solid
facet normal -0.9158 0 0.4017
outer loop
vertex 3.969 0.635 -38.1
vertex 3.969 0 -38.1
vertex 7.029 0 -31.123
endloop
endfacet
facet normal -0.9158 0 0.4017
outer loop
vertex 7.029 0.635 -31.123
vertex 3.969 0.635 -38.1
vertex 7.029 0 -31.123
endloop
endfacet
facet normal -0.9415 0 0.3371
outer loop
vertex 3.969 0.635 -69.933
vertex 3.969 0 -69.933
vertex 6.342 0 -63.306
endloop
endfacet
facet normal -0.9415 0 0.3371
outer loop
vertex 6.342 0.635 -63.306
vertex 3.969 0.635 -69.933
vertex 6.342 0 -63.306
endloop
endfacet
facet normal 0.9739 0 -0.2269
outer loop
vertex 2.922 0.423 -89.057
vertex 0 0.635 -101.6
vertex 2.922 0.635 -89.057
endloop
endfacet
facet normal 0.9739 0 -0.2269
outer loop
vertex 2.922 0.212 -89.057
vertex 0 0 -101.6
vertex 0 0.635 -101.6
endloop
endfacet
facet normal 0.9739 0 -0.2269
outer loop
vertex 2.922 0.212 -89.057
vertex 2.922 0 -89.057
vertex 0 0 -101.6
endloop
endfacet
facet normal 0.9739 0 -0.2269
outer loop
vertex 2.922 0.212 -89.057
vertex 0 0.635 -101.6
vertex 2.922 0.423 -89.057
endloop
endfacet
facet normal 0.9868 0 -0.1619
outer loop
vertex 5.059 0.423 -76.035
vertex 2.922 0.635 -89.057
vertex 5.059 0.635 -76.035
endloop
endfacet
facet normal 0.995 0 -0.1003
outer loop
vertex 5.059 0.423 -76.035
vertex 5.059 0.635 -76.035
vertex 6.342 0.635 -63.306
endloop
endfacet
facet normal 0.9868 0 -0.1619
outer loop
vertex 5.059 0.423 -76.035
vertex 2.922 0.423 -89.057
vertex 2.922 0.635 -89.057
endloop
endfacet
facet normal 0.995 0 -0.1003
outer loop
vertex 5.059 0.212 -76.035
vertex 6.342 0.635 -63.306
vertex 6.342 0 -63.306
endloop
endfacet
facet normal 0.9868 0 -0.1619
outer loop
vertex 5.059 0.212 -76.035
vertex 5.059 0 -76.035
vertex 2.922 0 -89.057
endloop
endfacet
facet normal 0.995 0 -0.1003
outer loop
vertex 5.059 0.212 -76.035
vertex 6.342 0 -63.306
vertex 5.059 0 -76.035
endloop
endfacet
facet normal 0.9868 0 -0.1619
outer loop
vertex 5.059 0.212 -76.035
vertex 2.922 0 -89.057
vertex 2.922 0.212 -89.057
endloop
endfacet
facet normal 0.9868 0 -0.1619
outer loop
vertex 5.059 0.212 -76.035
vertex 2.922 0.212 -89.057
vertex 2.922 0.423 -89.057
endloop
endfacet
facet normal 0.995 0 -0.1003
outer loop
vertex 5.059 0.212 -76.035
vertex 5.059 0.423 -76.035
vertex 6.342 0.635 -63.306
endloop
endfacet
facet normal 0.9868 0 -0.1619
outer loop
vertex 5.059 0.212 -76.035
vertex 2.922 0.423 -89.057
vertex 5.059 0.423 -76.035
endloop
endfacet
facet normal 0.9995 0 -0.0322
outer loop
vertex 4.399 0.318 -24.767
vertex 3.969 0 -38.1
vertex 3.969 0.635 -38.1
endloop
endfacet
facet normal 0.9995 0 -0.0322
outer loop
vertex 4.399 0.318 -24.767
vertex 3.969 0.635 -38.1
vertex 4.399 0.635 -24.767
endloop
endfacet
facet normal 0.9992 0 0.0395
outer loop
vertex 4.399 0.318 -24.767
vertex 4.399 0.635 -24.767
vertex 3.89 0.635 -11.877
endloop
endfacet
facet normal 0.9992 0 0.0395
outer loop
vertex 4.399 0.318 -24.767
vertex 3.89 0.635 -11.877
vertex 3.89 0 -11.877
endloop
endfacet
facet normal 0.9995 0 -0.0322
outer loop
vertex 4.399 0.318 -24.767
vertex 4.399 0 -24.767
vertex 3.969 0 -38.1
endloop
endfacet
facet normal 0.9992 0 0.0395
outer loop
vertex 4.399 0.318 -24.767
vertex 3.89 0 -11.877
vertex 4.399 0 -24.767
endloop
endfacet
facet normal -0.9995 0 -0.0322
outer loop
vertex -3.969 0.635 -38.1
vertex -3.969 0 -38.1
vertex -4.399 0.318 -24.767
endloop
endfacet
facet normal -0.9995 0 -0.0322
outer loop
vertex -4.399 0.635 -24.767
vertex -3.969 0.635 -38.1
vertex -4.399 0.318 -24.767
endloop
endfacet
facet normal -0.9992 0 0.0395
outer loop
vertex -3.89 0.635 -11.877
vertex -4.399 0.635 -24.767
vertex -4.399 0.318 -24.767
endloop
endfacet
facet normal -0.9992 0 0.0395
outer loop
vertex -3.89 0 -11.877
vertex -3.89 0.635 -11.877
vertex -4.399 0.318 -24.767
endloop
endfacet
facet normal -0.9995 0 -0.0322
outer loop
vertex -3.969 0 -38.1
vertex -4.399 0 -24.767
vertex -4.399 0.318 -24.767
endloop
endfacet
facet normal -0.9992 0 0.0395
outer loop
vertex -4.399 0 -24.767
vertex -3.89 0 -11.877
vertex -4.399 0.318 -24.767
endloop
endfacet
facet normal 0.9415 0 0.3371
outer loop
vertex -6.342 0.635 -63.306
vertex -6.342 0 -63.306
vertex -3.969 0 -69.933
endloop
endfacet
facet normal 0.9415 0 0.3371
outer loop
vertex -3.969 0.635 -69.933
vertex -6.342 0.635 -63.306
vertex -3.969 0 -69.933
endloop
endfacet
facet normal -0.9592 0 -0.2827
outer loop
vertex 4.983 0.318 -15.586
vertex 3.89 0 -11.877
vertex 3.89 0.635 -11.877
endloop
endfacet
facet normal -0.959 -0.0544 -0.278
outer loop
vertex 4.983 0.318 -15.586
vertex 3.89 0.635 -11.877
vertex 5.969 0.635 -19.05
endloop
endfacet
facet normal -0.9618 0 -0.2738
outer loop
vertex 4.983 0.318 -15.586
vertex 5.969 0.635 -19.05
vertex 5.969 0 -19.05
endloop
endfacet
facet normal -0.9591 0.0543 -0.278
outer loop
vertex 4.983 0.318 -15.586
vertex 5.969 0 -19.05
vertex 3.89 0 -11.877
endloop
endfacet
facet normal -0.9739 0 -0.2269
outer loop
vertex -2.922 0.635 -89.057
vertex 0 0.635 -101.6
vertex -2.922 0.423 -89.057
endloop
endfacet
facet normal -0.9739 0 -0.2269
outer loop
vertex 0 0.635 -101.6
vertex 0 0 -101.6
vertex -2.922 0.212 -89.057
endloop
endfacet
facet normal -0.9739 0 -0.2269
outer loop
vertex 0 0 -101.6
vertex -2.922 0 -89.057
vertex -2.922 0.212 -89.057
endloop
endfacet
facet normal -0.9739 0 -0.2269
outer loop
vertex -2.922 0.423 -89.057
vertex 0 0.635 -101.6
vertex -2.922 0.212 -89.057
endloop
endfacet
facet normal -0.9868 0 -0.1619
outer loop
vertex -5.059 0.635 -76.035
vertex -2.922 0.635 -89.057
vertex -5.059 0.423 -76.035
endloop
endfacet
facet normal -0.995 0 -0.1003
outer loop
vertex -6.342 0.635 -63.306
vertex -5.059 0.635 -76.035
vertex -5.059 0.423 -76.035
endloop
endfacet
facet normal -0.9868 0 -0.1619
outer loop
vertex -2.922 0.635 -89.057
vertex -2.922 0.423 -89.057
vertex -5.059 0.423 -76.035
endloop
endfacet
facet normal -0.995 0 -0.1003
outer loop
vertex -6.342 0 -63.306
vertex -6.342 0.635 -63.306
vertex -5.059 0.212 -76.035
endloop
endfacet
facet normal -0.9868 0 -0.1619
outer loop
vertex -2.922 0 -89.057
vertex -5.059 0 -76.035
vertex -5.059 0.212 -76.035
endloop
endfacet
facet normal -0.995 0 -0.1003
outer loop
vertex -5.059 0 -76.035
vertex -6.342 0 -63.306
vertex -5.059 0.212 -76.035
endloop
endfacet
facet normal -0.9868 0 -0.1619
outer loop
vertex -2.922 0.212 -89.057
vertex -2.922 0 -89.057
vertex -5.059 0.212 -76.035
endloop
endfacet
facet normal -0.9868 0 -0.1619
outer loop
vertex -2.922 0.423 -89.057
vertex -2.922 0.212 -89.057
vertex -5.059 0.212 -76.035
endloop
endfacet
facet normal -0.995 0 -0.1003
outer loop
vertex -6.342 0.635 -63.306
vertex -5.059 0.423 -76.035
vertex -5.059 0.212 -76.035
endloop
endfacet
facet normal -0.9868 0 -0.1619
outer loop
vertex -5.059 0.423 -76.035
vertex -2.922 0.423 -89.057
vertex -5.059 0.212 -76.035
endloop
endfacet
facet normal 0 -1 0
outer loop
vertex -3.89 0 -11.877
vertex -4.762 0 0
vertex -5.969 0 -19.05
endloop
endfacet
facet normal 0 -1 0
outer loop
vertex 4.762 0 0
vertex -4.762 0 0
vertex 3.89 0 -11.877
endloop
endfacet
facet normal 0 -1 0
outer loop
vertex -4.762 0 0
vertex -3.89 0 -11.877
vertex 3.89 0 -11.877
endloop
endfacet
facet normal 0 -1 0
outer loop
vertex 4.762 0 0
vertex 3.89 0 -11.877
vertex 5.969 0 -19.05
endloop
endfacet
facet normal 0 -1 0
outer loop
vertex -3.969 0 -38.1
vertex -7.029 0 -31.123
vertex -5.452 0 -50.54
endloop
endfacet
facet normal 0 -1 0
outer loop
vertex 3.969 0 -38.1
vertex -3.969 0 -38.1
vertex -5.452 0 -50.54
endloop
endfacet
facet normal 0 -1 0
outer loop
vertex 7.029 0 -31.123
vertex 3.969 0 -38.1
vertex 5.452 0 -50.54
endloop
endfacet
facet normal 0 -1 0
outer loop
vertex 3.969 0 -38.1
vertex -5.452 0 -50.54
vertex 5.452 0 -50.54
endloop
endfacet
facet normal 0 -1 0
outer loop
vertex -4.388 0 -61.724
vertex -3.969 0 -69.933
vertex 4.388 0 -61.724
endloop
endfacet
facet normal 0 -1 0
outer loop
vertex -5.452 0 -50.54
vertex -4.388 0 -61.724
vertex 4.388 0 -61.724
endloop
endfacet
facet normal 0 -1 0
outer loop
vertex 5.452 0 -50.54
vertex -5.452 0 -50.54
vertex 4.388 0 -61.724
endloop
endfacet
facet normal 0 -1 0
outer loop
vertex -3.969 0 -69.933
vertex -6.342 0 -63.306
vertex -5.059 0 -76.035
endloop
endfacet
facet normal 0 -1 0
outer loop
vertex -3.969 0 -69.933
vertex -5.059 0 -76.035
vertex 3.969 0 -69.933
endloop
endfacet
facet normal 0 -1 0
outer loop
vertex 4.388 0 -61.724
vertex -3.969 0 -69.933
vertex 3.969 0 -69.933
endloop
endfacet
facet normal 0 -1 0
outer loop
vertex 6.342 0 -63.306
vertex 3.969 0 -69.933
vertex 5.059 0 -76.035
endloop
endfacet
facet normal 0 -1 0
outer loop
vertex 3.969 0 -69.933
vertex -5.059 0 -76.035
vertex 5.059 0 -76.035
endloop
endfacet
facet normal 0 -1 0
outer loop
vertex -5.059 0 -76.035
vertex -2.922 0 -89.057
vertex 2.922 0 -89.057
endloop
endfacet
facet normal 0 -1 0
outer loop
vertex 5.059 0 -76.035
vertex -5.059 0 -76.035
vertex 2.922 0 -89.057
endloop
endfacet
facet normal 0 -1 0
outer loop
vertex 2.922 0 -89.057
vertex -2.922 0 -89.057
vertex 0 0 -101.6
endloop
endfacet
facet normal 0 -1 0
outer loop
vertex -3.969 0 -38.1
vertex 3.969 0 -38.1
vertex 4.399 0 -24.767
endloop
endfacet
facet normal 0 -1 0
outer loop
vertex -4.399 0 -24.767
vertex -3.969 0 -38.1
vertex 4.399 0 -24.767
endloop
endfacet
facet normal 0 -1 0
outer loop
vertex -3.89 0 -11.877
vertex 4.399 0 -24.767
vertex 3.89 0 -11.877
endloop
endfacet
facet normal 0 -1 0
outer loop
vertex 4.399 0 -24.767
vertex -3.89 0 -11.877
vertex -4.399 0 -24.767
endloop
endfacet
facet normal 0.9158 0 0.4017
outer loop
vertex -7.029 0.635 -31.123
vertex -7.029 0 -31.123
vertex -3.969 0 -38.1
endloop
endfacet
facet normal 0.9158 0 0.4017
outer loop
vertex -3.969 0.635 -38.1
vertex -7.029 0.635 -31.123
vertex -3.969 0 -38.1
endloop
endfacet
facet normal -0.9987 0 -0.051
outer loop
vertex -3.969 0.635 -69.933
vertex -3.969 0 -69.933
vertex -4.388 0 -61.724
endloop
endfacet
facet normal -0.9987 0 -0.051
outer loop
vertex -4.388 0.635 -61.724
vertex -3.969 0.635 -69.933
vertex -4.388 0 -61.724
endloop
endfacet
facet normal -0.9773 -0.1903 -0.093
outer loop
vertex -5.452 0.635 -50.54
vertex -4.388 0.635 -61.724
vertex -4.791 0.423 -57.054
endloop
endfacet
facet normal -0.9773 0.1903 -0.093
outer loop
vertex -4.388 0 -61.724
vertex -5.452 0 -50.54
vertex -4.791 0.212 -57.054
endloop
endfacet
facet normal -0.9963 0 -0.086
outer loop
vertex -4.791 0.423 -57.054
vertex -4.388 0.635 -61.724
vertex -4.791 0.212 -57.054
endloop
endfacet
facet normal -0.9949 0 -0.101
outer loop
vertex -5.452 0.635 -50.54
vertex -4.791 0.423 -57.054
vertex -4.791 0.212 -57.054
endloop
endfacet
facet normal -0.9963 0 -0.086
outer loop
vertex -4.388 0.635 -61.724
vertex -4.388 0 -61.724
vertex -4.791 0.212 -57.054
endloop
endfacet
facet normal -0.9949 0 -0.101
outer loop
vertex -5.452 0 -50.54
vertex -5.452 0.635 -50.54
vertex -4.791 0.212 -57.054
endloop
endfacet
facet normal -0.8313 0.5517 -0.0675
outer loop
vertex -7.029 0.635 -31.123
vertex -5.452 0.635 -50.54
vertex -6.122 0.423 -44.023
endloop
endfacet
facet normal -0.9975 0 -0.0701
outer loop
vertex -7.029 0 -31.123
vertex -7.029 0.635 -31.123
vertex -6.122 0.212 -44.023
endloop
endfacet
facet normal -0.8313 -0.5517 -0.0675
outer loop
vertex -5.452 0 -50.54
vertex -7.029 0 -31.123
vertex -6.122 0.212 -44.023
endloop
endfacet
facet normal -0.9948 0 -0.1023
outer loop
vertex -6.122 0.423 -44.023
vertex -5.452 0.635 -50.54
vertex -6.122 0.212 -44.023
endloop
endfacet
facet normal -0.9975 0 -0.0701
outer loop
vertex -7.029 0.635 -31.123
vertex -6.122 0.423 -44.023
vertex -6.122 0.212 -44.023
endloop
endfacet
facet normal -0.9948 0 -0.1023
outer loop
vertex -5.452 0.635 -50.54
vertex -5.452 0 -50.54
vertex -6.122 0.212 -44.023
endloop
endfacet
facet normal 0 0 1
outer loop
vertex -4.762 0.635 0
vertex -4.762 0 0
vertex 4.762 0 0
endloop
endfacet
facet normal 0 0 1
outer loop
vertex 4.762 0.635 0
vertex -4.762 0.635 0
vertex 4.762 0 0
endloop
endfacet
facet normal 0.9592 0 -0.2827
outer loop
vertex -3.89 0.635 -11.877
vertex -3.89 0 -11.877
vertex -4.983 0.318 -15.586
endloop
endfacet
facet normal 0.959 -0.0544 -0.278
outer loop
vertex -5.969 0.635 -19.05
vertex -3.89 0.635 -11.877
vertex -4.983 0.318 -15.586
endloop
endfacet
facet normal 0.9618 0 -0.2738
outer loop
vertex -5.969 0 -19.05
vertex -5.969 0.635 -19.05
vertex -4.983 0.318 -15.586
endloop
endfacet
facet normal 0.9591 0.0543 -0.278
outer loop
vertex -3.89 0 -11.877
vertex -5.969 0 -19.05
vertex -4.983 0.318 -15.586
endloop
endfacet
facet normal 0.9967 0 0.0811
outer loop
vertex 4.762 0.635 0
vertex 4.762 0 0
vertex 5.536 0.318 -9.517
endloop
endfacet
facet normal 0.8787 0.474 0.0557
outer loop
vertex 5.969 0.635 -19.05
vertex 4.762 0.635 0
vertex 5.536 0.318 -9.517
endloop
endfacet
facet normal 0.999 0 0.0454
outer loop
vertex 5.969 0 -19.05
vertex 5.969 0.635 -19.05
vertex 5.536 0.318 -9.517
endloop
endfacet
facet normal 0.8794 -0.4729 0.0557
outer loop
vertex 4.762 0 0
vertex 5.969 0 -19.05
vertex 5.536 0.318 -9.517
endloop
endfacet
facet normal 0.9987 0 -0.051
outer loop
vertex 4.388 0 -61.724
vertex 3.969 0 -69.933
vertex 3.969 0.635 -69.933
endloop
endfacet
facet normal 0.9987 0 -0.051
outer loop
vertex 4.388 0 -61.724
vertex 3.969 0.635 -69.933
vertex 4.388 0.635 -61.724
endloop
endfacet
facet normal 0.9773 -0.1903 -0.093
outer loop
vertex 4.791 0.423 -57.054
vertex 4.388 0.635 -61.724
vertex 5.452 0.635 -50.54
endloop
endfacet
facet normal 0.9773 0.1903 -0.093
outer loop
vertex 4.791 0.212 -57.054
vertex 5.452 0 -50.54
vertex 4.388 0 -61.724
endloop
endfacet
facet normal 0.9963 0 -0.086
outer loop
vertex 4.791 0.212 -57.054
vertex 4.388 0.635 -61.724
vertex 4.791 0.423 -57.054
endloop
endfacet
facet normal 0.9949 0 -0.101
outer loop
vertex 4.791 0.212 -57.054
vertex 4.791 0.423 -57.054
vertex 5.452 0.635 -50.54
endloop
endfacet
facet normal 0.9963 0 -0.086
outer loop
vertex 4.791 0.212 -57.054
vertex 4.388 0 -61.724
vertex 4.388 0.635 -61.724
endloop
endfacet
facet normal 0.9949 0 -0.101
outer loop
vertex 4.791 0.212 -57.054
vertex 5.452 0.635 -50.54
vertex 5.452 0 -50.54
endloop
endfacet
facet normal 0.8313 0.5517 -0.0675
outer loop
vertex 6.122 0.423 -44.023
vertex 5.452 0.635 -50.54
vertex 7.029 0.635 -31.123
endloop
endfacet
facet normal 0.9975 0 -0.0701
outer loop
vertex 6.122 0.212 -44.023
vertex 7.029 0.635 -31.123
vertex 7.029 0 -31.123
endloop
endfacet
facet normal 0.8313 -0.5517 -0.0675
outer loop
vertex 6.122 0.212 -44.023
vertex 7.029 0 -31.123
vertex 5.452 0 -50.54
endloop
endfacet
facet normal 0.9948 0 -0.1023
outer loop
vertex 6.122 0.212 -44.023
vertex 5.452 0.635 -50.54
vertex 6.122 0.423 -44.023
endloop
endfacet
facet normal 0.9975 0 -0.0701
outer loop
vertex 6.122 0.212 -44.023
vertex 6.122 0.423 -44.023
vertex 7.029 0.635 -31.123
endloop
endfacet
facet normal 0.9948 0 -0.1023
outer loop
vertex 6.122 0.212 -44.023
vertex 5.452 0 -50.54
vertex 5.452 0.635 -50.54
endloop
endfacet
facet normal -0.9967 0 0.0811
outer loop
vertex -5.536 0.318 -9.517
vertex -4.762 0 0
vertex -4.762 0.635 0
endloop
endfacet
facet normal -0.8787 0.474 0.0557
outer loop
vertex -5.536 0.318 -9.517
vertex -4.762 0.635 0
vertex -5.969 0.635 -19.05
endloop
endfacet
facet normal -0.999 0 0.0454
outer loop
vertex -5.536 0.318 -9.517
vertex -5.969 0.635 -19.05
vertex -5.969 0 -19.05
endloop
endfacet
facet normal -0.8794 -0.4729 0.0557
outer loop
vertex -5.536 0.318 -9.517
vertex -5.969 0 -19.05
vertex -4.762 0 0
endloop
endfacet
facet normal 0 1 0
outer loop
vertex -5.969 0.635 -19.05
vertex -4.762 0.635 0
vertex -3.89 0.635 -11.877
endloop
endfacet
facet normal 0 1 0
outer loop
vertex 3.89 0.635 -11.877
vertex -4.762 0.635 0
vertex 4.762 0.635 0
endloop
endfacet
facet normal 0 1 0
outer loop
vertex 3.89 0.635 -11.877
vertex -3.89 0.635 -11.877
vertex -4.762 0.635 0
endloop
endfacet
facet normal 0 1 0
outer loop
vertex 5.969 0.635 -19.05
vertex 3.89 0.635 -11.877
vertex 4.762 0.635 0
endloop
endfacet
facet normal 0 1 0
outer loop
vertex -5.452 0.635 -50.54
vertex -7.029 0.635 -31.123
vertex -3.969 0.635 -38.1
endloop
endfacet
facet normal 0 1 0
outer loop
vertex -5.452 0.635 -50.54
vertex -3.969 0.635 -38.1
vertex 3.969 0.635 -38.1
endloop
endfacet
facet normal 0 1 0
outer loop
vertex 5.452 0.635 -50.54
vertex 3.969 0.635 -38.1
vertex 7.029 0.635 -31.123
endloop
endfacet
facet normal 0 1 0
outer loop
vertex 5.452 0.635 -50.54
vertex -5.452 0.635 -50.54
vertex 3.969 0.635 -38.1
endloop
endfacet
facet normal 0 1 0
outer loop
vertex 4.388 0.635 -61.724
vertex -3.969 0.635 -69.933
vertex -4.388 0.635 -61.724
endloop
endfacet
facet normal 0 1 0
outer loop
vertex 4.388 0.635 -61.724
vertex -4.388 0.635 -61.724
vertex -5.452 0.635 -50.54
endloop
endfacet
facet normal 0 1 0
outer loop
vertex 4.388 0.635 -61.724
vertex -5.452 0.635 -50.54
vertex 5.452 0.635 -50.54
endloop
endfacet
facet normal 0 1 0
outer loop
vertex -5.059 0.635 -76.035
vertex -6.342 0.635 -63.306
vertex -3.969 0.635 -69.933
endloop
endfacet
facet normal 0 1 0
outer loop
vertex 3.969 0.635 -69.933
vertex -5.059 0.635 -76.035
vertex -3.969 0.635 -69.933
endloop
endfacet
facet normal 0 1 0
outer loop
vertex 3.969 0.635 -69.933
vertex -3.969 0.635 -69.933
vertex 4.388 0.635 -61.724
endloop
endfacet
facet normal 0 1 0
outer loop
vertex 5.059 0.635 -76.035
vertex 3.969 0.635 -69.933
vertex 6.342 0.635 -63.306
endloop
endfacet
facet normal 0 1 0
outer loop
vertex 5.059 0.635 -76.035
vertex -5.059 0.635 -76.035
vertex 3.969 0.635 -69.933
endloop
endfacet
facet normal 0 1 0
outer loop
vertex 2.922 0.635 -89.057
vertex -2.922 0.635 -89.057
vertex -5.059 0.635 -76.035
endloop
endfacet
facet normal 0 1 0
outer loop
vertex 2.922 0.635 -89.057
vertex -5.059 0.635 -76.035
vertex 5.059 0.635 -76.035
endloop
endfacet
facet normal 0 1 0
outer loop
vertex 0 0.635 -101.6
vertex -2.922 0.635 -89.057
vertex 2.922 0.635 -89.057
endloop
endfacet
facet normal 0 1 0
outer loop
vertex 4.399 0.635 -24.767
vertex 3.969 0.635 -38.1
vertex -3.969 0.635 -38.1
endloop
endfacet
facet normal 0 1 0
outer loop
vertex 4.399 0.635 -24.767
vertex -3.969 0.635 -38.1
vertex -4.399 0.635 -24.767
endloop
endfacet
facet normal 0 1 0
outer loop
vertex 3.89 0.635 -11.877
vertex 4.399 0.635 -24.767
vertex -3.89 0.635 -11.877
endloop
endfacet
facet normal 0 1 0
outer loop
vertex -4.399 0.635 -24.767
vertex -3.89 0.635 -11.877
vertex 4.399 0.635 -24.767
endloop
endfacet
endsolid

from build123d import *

# Parameters (mm, degrees)
BOSS_EXTRUDE1_DEPTH = 0.635


with BuildPart() as part:
    # Sketch1 → Boss-Extrude1 (new body)
    with BuildSketch(Plane(origin=(0, 0, 0), x_dir=(1, 0, 0), z_dir=(0, 1, 0))):
        with BuildLine():
            Line((-4.7625, 0), (0, 0))
            Line((0, 0), (0, 101.6))
            add(Edge.make_bspline(
                [(0, 101.6), (-3.29157344, 89.553724647), (-5.507928579, 75.631531474), (-6.342018648, 63.306201638)],
                knots=[0, 0, 0, 0, 1, 1, 1, 1], degree=3))
            Line((-6.342018648, 63.306201638), (-3.96875, 69.932898034))
            add(Edge.make_bspline(
                [(-3.96875, 69.932898034), (-4.226464503, 57.224491344), (-6.645417813, 43.863409348), (-7.029062123, 31.123476805)],
                knots=[0, 0, 0, 0, 1, 1, 1, 1], degree=3))
            Line((-7.029062123, 31.123476805), (-3.96875, 38.1))
            add(Edge.make_bspline(
                [(-3.96875, 38.1), (-4.867929466, 24.545209762), (-3.889947106, 11.87670313)],
                knots=[0, 0, 0, 1, 1, 1], degree=2))
            add(Edge.make_bspline(
                [(-3.889947106, 11.87670313), (-5.03752141, 15.708655714), (-5.969, 19.05)],
                knots=[0, 0, 0, 1, 1, 1], degree=2))
            add(Edge.make_bspline(
                [(-4.7625, 0), (-5.706405824, 9.509529369), (-5.969, 19.05)],
                knots=[0, 0, 0, 1, 1, 1], degree=2))
        make_face()
        with BuildLine():
            Line((0, 101.6), (0, 0))
            Line((0, 0), (4.7625, 0))
            add(Edge.make_bspline(
                [(4.7625, 0), (5.706405824, 9.509529369), (5.969, 19.05)],
                knots=[0, 0, 0, 1, 1, 1], degree=2))
            add(Edge.make_bspline(
                [(3.889947106, 11.87670313), (5.03752141, 15.708655714), (5.969, 19.05)],
                knots=[0, 0, 0, 1, 1, 1], degree=2))
            add(Edge.make_bspline(
                [(3.96875, 38.1), (4.867929466, 24.545209762), (3.889947106, 11.87670313)],
                knots=[0, 0, 0, 1, 1, 1], degree=2))
            Line((3.96875, 38.1), (7.029062123, 31.123476805))
            add(Edge.make_bspline(
                [(3.96875, 69.932898034), (4.226464503, 57.224491344), (6.645417813, 43.863409348), (7.029062123, 31.123476805)],
                knots=[0, 0, 0, 0, 1, 1, 1, 1], degree=3))
            Line((3.96875, 69.932898034), (6.342018648, 63.306201638))
            add(Edge.make_bspline(
                [(0, 101.6), (3.29157344, 89.553724647), (5.507928579, 75.631531474), (6.342018648, 63.306201638)],
                knots=[0, 0, 0, 0, 1, 1, 1, 1], degree=3))
        make_face()
    extrude(amount=BOSS_EXTRUDE1_DEPTH)


solid = part.part
